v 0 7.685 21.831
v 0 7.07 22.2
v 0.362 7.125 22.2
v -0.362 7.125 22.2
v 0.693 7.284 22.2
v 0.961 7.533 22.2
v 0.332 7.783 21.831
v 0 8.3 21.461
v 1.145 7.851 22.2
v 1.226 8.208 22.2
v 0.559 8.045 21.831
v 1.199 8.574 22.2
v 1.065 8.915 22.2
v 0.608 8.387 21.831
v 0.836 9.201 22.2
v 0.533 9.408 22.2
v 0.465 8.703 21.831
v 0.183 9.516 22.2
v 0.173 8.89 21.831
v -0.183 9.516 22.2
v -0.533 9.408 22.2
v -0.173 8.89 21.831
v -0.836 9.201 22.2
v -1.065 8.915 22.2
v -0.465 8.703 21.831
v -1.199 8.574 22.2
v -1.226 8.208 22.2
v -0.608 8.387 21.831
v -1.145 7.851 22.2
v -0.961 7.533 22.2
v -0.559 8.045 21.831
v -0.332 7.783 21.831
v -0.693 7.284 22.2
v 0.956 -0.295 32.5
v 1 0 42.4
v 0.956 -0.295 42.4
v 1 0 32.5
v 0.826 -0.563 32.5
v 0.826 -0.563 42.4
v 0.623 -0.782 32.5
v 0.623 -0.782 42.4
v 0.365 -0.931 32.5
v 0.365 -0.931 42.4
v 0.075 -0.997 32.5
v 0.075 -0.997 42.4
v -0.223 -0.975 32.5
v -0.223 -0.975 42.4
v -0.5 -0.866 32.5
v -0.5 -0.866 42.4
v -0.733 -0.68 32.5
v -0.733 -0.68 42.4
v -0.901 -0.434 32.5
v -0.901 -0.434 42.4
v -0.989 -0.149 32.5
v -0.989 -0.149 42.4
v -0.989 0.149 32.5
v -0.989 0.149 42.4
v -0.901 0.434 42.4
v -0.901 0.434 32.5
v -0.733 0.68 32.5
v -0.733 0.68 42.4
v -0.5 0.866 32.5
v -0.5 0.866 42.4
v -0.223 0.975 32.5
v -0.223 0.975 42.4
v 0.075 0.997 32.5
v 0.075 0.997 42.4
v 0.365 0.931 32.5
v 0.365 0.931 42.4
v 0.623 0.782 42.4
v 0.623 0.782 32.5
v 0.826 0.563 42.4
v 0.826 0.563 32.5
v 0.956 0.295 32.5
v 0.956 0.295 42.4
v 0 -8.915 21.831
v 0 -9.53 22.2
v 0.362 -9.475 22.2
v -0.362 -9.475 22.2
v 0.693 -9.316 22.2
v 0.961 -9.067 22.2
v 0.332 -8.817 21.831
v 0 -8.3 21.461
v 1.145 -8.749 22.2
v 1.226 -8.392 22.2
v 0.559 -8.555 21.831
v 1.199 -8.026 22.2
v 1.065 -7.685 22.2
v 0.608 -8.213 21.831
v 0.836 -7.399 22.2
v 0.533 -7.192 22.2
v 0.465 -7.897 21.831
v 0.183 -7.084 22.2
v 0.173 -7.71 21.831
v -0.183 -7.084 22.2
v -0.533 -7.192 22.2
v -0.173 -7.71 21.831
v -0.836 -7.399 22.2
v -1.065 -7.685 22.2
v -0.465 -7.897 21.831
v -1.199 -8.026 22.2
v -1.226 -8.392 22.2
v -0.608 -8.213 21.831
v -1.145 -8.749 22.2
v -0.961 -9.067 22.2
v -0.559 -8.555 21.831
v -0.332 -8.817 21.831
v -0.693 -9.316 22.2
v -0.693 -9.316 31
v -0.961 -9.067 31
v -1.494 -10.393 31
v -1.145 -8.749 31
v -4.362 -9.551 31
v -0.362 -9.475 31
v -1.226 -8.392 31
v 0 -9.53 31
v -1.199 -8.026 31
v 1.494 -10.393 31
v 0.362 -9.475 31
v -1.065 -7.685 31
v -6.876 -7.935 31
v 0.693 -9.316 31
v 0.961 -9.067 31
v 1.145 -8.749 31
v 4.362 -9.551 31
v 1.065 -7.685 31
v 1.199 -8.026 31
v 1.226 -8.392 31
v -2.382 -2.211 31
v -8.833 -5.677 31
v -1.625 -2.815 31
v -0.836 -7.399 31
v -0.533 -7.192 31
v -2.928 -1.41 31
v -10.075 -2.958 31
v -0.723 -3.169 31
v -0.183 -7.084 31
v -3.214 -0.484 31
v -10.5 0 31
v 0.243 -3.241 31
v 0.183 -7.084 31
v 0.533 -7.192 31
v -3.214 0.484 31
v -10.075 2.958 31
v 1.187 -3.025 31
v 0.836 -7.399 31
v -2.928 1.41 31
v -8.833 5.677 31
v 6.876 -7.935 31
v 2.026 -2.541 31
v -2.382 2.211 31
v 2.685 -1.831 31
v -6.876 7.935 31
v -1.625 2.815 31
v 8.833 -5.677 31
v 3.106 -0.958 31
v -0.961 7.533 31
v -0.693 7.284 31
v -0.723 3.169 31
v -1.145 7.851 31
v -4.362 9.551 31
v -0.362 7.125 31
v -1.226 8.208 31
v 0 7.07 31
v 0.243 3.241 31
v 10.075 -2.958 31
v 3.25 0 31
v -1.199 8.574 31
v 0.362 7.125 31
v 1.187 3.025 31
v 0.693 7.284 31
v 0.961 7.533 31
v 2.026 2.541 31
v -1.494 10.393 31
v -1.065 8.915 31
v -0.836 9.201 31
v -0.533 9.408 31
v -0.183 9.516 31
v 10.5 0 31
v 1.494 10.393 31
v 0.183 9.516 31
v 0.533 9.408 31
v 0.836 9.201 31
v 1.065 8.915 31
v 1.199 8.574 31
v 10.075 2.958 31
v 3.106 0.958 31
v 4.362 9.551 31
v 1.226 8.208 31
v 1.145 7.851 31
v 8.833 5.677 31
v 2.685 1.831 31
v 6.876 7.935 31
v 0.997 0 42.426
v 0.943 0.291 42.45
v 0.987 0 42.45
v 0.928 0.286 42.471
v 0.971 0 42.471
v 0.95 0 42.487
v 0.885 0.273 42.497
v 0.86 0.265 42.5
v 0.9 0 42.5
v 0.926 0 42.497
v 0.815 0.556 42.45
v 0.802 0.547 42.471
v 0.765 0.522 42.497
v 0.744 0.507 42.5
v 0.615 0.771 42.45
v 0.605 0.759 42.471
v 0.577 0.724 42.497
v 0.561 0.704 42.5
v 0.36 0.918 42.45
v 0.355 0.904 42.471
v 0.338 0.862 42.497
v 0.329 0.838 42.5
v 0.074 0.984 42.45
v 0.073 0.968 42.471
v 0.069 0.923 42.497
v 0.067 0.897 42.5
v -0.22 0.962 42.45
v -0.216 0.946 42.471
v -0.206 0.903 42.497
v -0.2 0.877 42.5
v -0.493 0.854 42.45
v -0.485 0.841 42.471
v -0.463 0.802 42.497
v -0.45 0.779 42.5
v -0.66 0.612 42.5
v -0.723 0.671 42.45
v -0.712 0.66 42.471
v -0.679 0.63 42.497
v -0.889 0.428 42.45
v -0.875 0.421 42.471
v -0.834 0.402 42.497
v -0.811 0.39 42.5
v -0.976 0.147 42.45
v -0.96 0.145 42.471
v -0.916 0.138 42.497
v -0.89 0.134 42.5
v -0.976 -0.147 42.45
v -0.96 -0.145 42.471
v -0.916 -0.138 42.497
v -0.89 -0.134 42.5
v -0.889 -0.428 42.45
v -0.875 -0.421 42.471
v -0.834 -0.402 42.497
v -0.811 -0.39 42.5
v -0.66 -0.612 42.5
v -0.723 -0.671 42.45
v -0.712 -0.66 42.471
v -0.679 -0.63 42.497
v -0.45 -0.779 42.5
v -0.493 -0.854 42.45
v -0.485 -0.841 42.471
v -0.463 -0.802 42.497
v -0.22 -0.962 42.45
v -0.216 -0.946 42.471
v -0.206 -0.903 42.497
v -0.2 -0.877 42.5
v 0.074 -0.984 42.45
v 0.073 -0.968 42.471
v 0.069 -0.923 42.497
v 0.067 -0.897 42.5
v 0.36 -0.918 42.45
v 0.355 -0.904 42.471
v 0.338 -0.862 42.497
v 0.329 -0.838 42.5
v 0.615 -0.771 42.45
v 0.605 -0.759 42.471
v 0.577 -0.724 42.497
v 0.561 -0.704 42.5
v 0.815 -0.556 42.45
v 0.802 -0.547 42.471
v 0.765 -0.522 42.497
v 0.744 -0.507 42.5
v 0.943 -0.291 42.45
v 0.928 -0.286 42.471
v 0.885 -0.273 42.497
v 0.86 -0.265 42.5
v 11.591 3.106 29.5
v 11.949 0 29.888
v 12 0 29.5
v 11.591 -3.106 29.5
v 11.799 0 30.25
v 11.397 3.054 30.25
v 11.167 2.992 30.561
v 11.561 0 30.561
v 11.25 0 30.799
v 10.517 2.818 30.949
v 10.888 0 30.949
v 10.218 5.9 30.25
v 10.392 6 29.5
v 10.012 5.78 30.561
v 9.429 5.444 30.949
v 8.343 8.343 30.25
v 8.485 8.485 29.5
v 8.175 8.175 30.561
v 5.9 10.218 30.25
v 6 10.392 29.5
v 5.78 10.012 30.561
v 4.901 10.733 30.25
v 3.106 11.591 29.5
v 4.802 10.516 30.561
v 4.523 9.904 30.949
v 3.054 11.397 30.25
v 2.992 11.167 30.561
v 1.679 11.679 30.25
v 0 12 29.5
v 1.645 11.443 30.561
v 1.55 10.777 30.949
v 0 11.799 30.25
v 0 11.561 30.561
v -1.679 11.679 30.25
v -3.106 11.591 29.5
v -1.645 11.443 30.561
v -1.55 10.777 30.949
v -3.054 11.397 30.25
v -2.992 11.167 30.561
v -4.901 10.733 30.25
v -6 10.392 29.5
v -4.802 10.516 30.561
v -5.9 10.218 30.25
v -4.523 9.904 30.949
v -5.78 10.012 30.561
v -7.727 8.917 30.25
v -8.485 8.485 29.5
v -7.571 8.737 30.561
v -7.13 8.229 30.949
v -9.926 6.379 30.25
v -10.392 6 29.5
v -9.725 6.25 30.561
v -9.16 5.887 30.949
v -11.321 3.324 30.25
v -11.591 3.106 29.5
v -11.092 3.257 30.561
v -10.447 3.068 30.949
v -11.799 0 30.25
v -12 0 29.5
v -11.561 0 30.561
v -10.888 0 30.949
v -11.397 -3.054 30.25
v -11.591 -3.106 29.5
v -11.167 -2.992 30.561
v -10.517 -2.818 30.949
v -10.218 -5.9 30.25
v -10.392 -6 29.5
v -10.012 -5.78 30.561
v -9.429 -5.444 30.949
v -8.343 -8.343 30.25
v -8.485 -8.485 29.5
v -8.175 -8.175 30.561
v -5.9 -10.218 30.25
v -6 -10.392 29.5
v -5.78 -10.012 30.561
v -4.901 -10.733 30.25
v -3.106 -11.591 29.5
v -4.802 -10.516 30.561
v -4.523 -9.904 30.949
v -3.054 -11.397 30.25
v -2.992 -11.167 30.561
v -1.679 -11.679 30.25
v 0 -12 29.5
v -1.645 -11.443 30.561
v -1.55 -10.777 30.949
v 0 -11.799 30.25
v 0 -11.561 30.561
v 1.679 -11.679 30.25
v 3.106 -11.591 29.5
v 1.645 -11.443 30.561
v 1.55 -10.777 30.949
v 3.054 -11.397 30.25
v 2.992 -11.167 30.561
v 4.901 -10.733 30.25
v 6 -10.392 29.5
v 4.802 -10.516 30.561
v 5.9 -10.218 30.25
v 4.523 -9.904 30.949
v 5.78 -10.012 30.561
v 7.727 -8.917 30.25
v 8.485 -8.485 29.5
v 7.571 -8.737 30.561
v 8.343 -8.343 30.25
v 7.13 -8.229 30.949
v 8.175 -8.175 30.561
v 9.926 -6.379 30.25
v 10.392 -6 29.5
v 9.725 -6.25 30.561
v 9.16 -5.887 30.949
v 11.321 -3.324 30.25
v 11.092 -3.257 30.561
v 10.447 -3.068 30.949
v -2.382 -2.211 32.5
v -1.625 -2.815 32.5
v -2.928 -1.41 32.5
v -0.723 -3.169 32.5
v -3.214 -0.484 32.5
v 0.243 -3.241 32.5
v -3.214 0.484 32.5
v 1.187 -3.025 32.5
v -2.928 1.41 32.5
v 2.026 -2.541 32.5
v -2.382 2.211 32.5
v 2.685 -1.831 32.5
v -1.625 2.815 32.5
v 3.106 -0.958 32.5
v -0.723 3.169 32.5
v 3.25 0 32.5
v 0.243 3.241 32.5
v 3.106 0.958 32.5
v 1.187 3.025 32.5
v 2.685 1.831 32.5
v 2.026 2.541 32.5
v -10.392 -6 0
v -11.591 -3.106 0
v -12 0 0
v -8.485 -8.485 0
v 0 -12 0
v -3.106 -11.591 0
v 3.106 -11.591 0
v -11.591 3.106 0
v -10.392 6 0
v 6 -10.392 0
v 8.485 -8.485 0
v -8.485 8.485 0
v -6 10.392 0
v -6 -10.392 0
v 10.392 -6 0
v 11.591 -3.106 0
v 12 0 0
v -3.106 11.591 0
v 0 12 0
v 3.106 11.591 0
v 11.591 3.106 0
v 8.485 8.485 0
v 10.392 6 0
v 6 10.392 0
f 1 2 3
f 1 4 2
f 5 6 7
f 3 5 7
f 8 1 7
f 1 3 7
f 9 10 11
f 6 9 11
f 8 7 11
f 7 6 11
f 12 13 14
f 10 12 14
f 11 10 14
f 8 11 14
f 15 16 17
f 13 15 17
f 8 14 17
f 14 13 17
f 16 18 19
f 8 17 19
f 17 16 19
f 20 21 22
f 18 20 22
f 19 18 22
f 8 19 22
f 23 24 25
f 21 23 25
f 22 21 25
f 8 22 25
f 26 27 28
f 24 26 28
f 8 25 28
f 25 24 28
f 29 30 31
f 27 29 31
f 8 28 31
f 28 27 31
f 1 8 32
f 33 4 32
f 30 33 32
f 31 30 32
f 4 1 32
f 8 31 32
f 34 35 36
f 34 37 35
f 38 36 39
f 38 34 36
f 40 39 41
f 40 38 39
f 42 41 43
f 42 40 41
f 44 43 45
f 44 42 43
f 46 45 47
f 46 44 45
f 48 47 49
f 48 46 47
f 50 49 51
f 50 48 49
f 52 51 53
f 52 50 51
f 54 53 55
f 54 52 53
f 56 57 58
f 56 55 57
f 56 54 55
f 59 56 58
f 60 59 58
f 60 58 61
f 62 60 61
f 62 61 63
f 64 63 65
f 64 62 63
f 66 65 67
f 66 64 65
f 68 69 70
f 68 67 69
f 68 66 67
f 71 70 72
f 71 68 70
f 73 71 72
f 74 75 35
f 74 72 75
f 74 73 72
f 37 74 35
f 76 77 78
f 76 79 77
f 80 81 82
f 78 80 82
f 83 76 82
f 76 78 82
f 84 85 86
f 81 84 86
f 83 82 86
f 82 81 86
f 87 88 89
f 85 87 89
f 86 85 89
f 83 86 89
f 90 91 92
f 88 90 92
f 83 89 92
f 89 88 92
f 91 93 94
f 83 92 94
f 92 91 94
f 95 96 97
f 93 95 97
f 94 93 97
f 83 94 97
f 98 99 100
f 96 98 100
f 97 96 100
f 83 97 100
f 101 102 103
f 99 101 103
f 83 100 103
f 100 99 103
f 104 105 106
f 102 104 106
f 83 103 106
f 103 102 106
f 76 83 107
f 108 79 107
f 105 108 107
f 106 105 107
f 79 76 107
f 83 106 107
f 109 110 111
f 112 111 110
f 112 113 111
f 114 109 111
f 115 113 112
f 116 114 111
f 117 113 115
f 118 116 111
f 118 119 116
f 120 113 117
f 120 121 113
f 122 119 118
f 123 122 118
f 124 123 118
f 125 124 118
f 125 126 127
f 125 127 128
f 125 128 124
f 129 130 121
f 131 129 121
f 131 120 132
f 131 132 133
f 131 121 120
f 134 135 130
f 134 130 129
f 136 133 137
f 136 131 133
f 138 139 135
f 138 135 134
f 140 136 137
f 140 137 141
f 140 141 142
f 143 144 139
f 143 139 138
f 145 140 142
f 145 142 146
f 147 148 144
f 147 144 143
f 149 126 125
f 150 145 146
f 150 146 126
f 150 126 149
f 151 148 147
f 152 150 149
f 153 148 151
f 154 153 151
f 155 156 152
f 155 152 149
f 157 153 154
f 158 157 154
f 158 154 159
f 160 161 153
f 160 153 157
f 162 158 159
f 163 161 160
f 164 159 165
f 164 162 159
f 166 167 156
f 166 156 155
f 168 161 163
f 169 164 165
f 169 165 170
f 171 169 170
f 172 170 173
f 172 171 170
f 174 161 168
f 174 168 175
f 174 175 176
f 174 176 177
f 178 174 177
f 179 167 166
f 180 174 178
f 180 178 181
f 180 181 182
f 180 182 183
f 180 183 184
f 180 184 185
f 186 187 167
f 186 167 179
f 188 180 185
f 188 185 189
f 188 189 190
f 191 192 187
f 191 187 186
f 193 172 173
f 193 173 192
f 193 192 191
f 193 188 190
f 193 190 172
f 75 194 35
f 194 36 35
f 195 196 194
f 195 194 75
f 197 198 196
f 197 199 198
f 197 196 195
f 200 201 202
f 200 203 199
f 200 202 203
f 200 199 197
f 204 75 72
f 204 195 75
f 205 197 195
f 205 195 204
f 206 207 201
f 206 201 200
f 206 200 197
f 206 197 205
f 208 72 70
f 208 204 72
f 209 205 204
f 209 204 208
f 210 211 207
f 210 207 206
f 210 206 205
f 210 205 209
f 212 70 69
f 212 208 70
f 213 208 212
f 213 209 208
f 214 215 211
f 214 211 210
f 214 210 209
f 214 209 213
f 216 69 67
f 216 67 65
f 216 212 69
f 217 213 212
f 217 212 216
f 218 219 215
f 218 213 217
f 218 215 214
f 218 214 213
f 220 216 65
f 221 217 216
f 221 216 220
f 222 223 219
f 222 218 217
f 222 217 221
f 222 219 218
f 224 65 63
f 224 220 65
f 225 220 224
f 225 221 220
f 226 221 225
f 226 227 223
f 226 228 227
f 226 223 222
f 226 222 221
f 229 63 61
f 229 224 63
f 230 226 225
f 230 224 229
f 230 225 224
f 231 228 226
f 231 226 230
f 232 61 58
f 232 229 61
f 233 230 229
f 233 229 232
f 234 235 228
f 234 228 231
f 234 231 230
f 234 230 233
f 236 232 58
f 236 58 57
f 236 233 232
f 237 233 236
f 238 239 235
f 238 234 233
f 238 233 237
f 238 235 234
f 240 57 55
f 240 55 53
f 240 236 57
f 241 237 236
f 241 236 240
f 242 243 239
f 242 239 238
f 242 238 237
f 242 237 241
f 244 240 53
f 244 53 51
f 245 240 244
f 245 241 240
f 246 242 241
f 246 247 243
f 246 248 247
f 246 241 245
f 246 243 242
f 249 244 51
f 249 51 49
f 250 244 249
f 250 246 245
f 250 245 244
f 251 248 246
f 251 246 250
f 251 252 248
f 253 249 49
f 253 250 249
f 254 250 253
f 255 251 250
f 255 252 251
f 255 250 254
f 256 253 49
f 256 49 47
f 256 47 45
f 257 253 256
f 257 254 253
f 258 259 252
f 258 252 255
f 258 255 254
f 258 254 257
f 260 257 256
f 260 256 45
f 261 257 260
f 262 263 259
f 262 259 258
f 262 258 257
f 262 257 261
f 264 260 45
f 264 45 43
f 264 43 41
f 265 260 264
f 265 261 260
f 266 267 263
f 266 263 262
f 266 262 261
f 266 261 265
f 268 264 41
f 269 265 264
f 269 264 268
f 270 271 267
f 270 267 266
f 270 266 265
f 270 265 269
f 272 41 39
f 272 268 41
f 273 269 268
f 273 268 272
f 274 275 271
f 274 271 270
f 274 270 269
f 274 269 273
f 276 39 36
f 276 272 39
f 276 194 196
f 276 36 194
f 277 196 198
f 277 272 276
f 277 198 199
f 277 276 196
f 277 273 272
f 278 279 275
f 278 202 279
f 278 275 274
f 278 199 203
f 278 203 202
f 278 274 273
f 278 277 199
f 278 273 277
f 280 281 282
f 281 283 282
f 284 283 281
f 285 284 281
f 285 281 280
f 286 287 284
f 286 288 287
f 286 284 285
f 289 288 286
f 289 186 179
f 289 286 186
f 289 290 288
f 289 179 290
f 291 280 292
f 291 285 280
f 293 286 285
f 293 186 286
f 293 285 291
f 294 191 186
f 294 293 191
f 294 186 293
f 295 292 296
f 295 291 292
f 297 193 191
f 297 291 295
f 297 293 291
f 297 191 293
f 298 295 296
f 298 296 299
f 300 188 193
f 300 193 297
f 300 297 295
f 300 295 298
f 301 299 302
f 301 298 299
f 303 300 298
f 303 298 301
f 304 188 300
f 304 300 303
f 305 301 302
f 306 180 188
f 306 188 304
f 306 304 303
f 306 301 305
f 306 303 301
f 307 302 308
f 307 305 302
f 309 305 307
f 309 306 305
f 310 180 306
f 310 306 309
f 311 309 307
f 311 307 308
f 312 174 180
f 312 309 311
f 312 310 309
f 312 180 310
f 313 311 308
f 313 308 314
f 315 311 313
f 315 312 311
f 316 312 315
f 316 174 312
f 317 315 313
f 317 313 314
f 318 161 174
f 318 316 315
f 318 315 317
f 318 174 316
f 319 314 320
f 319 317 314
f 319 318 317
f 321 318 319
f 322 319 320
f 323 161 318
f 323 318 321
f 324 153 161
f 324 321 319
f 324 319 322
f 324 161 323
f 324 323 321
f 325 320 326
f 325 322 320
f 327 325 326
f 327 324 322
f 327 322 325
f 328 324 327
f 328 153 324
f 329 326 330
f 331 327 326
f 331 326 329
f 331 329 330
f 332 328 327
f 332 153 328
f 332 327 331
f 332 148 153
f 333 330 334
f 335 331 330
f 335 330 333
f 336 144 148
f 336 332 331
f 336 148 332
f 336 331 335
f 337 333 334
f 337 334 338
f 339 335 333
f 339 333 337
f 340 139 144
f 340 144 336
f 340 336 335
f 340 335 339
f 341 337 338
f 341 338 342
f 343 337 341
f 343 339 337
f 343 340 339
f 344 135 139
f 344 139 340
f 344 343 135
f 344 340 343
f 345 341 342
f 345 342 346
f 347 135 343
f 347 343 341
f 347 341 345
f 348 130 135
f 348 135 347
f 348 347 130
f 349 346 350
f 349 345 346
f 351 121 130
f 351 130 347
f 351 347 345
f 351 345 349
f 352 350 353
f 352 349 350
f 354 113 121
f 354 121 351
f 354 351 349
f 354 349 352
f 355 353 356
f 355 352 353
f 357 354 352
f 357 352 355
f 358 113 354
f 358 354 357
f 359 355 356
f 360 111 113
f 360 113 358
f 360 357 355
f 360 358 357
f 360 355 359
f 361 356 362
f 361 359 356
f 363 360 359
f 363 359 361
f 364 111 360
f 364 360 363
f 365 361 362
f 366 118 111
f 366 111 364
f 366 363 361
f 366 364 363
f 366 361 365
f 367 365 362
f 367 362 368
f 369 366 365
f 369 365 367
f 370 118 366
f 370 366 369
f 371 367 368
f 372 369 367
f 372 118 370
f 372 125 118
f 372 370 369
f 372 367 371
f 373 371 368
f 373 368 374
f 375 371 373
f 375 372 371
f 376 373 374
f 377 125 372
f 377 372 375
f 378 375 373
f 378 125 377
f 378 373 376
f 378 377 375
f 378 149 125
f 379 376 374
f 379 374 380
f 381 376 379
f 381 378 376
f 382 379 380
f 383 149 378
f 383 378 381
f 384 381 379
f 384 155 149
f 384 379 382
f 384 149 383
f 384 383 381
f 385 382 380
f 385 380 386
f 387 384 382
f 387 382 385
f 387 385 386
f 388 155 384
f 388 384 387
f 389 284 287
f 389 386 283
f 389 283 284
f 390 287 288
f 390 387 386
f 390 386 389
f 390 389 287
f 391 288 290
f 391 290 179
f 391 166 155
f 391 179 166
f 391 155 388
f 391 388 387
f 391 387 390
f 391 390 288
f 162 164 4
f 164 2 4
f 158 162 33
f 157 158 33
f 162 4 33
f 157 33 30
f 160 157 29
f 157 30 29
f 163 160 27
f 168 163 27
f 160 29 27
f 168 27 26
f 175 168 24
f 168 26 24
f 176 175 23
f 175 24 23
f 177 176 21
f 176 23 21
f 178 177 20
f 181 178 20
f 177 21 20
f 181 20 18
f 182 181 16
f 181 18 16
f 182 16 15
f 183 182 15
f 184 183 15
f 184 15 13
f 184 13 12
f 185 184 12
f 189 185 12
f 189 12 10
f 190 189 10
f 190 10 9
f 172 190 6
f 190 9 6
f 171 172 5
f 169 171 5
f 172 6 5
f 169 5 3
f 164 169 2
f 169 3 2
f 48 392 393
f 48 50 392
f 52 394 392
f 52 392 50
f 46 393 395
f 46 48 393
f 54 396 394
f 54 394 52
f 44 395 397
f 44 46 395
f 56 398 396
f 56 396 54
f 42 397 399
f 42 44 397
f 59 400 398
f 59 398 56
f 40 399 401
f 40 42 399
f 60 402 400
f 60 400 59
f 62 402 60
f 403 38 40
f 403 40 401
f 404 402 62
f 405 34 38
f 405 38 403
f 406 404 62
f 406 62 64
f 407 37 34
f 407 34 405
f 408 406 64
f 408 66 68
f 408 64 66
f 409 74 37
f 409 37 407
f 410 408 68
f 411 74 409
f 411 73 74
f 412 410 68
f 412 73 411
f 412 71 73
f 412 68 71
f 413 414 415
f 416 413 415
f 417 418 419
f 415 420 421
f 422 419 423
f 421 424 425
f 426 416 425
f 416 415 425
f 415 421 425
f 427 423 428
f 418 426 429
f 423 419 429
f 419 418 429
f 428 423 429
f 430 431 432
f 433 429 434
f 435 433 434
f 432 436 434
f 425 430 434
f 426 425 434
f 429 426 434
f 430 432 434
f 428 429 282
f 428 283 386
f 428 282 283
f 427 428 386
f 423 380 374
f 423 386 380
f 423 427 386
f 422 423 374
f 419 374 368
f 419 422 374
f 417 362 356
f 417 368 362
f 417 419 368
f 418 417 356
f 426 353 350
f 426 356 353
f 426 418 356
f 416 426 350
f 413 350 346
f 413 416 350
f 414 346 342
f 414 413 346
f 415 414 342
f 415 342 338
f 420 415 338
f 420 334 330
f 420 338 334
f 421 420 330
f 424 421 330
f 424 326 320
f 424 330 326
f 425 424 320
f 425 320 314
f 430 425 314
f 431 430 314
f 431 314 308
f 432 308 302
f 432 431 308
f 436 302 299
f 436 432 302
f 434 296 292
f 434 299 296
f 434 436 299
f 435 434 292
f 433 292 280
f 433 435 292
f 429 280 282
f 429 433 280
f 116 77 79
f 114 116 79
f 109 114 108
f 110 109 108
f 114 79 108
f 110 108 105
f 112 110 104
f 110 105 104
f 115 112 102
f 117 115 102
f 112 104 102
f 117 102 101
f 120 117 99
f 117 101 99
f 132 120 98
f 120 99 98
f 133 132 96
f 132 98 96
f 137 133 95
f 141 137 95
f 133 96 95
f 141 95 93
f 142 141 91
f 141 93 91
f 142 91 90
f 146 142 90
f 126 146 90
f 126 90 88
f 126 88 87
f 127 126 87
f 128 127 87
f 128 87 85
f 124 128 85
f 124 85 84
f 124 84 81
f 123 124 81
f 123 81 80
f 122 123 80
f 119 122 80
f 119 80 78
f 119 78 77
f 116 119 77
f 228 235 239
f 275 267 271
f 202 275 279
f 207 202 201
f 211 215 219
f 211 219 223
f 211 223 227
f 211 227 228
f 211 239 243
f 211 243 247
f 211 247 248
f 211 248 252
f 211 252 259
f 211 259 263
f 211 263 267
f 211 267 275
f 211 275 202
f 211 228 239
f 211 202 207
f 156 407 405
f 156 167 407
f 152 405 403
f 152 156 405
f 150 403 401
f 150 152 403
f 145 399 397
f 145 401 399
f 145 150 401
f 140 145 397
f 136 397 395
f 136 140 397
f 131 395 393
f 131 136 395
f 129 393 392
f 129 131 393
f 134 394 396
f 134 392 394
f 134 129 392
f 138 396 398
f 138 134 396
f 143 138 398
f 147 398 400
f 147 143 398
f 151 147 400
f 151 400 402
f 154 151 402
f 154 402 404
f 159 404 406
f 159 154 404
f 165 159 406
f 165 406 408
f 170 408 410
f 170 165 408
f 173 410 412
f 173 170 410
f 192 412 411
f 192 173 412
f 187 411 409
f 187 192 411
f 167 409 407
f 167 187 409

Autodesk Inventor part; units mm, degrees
ref_plane "YZ Plane" through (0, 0, 0) normal (1, 0, 0) x (0, 1, 0)
ref_plane "XZ Plane" through (0, 0, 0) normal (0, 1, 0) x (-1, 0, 0)
ref_plane "XY Plane" through (0, 0, 0) normal (0, 0, 1) x (1, 0, 0)
sketch "スケッチ1" plane through (0, 0, 0) normal (0, 0, 1) x (1, 0, 0)
  circle A0 centre (0, 0) radius 12
  dimension "d0" = 24
extrude "押し出し1" add sketch "スケッチ1" along normal blind 31
sketch "スケッチ2" plane through (0, 0, 31) normal (0, 0, 1) x (1, 0, 0)
  circle A0 centre (0, 0) radius 9.8 construction
  line L0 (0, -16.8) -> (0, 16.8) construction
  circle A1 centre (0, 8.3) radius 1.5
  circle A2 centre (0, -8.3) radius 1.5
  circle A3 centre (0, 0) radius 3.25
  dimension "d3" = 19.6
  dimension "d4" = 3
  dimension "d5" = 3
  dimension "d6" = 6.5
extrude "押し出し2" add sketch "スケッチ2" along normal blind 1.5 contours A3
hole "穴1" at (0, 8.3, 31) at (0, -8.3, 31) direction (0, 0, -1) diameter 2.459 depth 8.8 tip angle 118 thread size "M3x0.5" class "6H" standard "ANSI Metric M Profile"
fillet "フィレット1" radius 1.5 1 edges at (-12, 0, 31)
sketch "スケッチ3" plane through (0, 0, 32.5) normal (0, 0, 1) x (1, 0, 0)
  circle A0 centre (0, 0) radius 3.25 projected
  circle A1 centre (0, 0) radius 1
  dimension "d17" = 2
extrude "押し出し3" add sketch "スケッチ3" along normal blind 10 contours A1
fillet "フィレット2" radius 0.1 1 edges at (-1, 0, 42.5)
properties part number "tamiya_sporttuned"
